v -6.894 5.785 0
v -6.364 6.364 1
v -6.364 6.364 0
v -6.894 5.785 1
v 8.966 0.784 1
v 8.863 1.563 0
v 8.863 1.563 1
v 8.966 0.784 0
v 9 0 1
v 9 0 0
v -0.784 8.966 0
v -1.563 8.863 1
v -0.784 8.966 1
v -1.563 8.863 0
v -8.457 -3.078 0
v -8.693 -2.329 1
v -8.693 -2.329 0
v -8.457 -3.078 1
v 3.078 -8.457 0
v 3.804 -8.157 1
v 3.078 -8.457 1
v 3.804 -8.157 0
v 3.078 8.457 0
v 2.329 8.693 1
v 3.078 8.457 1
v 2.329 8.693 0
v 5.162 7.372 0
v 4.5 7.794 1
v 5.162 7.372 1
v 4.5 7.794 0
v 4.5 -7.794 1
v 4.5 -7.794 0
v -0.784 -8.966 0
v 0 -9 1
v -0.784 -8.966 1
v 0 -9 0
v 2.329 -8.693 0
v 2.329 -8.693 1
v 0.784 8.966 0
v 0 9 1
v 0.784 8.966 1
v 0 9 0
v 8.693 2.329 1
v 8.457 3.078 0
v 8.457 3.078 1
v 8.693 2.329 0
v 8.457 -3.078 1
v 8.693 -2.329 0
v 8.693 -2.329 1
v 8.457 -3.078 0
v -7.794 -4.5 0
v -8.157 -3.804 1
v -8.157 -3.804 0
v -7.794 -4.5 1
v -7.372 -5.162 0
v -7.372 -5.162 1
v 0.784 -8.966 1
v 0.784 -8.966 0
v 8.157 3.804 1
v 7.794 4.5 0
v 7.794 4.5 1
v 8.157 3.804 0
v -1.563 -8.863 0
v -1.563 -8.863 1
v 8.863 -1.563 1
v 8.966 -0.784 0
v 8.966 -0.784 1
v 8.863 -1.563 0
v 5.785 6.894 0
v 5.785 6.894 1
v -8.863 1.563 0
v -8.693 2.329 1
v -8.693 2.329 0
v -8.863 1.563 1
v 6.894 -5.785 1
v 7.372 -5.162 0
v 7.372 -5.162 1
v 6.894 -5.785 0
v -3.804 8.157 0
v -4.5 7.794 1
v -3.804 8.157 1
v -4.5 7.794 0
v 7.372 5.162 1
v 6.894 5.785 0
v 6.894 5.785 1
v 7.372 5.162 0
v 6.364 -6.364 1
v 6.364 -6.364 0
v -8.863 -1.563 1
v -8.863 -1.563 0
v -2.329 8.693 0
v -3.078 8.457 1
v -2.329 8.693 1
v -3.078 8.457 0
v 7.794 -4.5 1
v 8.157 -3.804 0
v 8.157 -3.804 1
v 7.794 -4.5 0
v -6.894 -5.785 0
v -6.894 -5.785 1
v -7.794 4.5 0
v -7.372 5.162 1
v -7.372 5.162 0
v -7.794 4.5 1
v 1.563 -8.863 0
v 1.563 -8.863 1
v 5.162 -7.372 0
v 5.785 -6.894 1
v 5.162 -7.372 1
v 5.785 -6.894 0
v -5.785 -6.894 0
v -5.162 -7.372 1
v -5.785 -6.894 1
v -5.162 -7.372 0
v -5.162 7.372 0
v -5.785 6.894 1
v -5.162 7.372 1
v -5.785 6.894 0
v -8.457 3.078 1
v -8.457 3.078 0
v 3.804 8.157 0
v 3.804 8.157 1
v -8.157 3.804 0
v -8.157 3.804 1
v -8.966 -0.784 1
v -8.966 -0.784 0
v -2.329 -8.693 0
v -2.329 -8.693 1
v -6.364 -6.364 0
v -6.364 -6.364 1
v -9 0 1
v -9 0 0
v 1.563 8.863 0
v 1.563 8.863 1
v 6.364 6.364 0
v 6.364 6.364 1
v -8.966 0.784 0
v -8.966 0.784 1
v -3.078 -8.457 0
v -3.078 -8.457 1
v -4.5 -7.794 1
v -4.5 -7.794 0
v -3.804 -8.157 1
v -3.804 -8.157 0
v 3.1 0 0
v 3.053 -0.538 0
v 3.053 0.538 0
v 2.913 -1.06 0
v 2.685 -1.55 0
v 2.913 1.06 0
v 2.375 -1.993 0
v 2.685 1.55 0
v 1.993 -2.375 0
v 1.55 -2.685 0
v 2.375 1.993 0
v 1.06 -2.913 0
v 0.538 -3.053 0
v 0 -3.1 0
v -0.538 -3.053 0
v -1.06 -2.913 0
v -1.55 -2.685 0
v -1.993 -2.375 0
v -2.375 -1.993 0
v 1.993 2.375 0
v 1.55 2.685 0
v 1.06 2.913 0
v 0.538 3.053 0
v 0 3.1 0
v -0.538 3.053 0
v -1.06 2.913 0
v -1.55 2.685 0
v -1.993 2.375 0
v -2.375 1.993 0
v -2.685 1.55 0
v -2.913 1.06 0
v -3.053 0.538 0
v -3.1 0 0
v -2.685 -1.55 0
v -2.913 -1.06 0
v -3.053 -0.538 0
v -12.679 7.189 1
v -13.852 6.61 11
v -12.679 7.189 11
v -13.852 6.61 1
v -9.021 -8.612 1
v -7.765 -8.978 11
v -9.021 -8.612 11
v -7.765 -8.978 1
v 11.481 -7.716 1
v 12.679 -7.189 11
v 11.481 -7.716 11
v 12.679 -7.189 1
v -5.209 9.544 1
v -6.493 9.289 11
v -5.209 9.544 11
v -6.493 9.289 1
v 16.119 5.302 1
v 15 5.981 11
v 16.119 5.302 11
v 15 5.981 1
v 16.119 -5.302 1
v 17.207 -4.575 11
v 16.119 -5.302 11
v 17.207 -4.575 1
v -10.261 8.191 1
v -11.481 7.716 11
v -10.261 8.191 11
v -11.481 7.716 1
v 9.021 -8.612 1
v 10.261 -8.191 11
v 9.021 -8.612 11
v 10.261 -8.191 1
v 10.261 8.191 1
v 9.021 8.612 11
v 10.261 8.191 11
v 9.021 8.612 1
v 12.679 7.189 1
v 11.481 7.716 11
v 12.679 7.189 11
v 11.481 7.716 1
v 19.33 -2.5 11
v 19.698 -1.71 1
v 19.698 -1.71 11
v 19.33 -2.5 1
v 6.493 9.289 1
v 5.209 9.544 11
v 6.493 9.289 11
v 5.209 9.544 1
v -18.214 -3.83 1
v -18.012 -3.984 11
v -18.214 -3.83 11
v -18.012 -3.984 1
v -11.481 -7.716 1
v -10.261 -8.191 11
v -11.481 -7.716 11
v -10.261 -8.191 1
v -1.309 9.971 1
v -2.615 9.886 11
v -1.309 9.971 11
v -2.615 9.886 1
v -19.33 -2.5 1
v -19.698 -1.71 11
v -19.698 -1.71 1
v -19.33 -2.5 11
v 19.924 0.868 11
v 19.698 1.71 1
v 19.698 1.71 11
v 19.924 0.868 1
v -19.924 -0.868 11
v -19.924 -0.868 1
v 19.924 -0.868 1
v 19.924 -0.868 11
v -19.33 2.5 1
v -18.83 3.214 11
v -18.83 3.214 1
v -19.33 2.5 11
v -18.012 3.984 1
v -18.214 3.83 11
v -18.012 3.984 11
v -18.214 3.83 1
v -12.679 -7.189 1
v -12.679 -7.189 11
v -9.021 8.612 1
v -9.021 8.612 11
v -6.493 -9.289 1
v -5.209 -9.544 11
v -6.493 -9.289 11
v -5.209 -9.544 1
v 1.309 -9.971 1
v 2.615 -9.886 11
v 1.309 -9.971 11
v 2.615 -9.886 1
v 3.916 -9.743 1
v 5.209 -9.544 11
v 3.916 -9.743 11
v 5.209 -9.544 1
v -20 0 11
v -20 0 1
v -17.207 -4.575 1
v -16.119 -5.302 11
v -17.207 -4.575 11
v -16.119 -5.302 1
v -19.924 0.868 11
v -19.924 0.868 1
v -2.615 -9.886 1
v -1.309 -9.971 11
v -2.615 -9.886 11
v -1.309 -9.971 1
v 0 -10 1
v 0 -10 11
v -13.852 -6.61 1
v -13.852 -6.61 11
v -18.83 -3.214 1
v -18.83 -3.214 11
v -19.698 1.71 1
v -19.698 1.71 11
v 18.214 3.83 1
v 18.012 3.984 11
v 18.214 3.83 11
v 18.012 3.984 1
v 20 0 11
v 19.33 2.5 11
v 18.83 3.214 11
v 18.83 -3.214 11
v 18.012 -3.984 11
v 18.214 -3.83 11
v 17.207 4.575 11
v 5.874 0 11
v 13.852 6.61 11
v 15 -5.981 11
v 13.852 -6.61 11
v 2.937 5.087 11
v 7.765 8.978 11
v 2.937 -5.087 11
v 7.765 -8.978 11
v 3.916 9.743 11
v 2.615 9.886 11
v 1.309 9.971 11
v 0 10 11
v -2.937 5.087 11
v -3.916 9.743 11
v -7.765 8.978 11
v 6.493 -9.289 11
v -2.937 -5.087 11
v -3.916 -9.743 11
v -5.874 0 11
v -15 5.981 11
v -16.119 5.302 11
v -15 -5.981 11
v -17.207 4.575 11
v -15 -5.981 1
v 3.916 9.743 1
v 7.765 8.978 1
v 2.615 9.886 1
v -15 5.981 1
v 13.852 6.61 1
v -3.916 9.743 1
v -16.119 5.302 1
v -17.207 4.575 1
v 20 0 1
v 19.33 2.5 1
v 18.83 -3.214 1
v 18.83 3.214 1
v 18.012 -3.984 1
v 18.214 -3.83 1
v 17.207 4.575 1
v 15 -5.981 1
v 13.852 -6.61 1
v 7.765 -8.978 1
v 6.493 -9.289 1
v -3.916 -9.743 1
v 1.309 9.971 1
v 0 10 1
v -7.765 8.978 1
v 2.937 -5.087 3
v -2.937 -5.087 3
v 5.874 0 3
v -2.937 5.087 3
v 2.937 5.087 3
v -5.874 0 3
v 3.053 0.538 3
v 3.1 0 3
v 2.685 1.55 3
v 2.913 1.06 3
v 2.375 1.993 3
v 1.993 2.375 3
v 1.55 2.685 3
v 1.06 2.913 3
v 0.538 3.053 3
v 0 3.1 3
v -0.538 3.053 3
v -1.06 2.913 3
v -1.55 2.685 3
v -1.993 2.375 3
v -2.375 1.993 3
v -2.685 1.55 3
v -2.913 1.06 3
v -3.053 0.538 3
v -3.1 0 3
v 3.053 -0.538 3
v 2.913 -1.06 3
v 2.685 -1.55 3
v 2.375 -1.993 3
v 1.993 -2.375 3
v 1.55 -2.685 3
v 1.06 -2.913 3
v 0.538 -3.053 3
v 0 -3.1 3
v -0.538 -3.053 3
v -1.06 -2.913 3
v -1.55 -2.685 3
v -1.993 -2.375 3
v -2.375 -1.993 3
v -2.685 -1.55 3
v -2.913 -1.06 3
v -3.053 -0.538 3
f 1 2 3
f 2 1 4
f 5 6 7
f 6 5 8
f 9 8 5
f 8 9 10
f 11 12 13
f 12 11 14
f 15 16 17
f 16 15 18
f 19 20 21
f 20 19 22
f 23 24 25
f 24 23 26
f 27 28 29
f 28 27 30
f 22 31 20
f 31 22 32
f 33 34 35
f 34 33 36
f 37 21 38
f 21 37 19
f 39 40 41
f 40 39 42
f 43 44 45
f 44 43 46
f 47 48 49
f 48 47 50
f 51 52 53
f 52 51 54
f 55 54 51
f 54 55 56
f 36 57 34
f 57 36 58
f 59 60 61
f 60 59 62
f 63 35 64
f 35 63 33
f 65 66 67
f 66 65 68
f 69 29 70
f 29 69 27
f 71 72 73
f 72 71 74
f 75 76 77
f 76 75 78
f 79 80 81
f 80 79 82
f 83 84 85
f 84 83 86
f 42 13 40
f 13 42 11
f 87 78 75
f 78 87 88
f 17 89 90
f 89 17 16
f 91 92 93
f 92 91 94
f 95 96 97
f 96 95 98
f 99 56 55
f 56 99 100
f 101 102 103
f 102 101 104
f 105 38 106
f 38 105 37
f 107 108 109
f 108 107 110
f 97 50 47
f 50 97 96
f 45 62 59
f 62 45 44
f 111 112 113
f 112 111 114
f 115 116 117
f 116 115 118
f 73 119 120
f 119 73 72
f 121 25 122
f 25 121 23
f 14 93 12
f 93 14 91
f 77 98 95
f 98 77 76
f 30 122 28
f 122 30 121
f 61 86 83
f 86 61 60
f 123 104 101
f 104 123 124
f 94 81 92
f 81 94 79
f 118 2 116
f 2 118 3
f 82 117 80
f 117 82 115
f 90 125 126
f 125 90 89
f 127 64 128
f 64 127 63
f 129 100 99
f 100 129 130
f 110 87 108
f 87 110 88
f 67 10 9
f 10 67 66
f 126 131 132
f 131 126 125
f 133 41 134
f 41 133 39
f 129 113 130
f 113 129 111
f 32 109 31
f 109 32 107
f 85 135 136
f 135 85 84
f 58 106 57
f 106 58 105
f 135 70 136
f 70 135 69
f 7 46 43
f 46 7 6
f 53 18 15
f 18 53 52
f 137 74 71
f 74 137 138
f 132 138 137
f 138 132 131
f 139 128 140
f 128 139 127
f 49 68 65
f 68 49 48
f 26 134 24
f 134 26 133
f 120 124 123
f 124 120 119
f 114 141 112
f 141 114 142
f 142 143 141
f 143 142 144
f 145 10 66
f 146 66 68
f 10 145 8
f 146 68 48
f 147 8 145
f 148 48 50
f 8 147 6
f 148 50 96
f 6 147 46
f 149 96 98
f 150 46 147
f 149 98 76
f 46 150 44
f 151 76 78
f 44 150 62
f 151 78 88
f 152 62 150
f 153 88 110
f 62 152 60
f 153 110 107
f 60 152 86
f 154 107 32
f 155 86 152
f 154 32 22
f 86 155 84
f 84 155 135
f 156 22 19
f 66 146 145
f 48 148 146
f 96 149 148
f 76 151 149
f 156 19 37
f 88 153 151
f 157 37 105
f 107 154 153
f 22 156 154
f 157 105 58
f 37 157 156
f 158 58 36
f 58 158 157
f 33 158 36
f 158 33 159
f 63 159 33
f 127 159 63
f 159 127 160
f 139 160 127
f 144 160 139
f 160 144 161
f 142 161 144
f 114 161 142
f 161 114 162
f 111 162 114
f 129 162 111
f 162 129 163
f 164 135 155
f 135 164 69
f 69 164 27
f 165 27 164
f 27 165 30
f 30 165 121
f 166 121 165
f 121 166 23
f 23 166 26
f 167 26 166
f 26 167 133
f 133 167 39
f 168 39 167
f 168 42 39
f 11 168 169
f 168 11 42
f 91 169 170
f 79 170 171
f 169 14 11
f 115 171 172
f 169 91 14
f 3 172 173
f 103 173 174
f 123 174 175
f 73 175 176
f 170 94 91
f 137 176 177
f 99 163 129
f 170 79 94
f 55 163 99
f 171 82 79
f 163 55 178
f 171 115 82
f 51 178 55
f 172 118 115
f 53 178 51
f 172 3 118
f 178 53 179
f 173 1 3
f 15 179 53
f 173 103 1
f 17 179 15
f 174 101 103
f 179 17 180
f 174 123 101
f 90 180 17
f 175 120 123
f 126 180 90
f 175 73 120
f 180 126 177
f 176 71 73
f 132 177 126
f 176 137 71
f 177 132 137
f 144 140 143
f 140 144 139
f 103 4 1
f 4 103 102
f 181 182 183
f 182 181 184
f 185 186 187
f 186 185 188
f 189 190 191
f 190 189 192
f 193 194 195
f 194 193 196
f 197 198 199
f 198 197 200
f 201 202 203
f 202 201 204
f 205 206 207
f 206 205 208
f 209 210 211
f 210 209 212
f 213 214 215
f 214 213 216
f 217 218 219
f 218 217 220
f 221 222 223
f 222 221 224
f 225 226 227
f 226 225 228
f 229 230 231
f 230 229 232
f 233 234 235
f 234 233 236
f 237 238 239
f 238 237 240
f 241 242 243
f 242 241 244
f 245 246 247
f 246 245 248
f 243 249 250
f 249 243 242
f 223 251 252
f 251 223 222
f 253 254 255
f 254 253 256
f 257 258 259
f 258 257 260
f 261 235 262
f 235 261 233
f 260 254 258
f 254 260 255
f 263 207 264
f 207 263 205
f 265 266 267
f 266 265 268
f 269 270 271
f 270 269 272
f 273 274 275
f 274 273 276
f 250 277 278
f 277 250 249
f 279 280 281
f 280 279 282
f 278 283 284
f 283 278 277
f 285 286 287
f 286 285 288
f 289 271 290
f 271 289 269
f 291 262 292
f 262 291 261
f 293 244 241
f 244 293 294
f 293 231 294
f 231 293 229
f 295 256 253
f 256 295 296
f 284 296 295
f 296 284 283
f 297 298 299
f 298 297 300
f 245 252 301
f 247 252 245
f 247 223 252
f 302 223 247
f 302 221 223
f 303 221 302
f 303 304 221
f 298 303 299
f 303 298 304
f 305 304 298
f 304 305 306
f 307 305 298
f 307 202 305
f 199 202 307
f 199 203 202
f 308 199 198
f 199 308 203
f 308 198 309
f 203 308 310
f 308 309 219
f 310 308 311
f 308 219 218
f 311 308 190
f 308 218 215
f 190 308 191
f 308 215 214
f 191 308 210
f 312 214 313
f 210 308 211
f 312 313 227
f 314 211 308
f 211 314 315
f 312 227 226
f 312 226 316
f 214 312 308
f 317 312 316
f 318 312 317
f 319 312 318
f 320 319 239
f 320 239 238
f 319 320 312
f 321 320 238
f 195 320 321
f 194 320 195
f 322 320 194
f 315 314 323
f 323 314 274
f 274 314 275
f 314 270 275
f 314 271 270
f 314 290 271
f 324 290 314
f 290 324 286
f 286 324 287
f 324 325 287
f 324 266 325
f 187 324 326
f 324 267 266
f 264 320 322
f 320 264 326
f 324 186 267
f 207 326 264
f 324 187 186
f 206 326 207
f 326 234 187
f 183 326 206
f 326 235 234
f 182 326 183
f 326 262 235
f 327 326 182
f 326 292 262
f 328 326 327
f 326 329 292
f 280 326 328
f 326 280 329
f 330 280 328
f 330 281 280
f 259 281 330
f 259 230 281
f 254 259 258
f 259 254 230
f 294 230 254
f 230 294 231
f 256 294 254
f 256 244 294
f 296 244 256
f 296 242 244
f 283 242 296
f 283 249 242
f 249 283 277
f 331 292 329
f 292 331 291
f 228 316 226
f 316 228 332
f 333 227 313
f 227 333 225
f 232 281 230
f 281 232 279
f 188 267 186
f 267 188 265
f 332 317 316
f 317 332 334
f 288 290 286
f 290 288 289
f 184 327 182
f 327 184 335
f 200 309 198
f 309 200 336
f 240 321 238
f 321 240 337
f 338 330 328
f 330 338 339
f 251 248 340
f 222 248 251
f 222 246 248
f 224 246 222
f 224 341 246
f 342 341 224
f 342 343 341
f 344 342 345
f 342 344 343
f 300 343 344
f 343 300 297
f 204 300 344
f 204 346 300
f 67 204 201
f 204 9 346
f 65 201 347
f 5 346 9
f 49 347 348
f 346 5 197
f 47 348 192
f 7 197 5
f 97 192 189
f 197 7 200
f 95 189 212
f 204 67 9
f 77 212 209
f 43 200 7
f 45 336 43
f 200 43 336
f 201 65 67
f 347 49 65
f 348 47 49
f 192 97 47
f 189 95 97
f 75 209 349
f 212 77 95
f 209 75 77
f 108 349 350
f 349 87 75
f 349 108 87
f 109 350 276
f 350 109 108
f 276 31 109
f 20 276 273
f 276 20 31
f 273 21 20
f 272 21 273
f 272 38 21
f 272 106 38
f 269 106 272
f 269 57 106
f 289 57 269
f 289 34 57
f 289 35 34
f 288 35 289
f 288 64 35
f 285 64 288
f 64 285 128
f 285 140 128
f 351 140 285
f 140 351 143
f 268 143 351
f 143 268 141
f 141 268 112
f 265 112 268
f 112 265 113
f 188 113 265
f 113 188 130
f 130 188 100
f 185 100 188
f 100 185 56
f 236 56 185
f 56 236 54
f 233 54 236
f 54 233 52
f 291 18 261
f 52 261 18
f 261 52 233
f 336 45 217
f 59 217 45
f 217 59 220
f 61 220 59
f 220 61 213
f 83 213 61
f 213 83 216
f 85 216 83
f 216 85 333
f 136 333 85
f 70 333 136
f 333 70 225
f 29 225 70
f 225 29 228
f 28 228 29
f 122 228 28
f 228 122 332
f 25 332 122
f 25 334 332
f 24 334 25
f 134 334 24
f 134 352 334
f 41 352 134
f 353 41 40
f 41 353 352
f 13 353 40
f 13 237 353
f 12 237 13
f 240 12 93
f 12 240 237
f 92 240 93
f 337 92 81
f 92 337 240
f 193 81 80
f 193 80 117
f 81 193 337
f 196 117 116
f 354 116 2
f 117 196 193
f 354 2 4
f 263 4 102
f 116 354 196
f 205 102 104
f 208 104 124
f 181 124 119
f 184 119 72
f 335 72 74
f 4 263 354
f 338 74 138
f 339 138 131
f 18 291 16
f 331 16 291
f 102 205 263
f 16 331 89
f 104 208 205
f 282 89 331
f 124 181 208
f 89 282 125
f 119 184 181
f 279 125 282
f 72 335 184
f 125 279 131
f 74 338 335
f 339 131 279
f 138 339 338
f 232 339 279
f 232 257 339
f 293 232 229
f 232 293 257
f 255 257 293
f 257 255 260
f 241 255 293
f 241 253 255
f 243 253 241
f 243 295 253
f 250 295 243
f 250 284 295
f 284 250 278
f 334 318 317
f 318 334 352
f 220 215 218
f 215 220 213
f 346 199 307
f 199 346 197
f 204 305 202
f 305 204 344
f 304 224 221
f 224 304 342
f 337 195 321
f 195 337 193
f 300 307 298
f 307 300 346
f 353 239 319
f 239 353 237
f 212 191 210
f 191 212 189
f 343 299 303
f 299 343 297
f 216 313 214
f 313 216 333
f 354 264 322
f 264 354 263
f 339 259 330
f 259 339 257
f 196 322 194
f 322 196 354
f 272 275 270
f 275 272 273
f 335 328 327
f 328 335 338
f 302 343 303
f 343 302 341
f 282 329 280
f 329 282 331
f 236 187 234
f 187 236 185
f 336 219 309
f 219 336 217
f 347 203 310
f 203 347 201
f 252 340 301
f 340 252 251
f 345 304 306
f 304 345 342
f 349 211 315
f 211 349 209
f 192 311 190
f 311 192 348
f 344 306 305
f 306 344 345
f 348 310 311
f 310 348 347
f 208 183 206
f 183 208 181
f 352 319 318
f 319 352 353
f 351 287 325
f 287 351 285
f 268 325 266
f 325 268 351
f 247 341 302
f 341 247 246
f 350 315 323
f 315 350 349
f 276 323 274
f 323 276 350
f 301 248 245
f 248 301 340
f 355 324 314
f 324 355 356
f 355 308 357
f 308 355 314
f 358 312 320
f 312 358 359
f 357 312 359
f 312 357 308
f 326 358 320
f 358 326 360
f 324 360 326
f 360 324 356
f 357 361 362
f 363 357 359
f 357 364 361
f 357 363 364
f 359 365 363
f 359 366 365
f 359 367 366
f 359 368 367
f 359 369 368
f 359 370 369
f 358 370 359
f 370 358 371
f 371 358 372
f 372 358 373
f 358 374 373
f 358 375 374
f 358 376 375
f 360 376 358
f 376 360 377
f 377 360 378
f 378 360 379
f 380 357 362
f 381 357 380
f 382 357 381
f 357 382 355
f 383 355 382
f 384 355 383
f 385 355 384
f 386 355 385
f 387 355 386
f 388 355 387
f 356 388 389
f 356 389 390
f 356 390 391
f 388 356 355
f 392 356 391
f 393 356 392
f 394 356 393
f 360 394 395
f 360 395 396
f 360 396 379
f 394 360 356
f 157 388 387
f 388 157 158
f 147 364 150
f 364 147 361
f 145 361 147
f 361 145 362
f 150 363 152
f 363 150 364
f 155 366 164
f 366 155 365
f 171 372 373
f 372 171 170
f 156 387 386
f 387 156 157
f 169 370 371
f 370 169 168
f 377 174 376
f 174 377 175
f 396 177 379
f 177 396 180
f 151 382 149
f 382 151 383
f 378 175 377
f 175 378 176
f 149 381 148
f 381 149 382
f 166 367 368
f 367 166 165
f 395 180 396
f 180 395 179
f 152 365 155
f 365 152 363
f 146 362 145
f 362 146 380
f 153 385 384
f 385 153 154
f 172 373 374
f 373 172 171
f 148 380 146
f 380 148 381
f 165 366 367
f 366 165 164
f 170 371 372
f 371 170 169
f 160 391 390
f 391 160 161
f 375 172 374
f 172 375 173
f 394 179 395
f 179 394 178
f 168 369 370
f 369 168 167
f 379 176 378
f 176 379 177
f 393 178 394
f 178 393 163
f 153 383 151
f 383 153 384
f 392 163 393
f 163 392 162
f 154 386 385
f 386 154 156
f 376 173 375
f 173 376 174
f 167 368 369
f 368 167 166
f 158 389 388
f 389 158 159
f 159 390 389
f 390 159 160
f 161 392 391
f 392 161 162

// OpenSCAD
module spacer() {
  difference() {
    intersection() {
      translate([0,0,2])rotate([0,90+3,0])cylinder(d=34,h=100,center=true,$fn=72);
      translate([0,0,30])cube([50,50,50],true);
    }
    rotate([0,90,0])cylinder(d=33,h=100,center=true,$fn=72);
    hull()for(a=[-1,1])rotate([a*5,0]) cylinder(d=9,h=30,$fn=24);
  }
}

module knob() {
  difference() {
    union() {
      cylinder(d=20,h=7,$fn=72);
      translate([0,0,1]) {
        cylinder(d=33,h=7,$fn=72);
        for(a=[0:60:360])rotate([0,0,a])translate([15,0])cylinder(d=10,h=7,$fn=36);
        }
    }
    translate([0,0,2])cylinder(d=10*2/sqrt(3)+0.2,h=10,$fn=6);
    cylinder(d=6.2,h=100,$fn=36,center=true);
        for(a=[0:60:360])rotate([0,0,a+30])translate([19.5,0])cylinder(d=10,h=10,$fn=36);
  }
}


module knob2() {
  h=10;
  difference() {
    union() {
      cylinder(d=18,h=7,$fn=72);
      translate([0,0,1])hull() {
        intersection() {
          translate([0,20])cylinder(d=60,h=h,$fn=72*2);
          translate([0,-20])cylinder(d=60,h=h,$fn=72*2);
          cylinder(d=37,h=100,center=true,$fn=36);
        }
        translate([15,0])cylinder(d=10,h=h,$fn=36);
        translate([-15,0])cylinder(d=10,h=h,$fn=36);
        /*
        cylinder(d=20,h=7,$fn=72);
        translate([0,0,1]) {
          cylinder(d=33,h=7,$fn=72);
          for(a=[0:60:360])rotate([0,0,a])translate([15,0])cylinder(d=10,h=7,$fn=36);
          }
        */
      }
    }
    translate([0,0,3])cylinder(d=10*2/sqrt(3)+0.2,h=10,$fn=6);
    cylinder(d=6.2,h=100,$fn=36,center=true);
  }
}

//knob();
knob2();
//spacer();
